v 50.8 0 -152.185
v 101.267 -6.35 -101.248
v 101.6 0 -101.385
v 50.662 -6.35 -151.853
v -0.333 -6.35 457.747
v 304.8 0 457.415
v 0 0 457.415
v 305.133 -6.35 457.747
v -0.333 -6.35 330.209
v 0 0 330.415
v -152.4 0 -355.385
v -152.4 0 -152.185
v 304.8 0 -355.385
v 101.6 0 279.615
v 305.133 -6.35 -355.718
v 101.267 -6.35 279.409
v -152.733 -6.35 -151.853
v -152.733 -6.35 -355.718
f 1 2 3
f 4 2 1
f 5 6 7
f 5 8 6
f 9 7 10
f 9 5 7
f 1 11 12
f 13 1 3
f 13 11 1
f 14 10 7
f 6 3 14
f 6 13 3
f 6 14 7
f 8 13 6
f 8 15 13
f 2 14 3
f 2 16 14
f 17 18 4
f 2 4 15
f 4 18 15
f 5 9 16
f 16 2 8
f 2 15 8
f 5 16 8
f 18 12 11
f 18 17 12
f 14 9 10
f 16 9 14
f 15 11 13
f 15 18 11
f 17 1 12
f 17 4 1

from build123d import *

# Parameters (mm, degrees)
F1_DEPTH = 6.35
F1_TAPER = -3


with BuildPart() as f1:
    # F0 (on Front) → F1 (new body)
    with BuildSketch(Plane.XZ):
        Polygon((50.8, -152.185426528), (-152.4, -152.185426528), (-152.4, -355.385426528), (304.8, -355.385426528), (304.8, 457.414573472), (0, 457.414573472), (0, 330.414573472), (101.6, 279.614573472), (101.6, -101.385426528), align=None)
    extrude(amount=F1_DEPTH, taper=F1_TAPER)


solid = f1.part
